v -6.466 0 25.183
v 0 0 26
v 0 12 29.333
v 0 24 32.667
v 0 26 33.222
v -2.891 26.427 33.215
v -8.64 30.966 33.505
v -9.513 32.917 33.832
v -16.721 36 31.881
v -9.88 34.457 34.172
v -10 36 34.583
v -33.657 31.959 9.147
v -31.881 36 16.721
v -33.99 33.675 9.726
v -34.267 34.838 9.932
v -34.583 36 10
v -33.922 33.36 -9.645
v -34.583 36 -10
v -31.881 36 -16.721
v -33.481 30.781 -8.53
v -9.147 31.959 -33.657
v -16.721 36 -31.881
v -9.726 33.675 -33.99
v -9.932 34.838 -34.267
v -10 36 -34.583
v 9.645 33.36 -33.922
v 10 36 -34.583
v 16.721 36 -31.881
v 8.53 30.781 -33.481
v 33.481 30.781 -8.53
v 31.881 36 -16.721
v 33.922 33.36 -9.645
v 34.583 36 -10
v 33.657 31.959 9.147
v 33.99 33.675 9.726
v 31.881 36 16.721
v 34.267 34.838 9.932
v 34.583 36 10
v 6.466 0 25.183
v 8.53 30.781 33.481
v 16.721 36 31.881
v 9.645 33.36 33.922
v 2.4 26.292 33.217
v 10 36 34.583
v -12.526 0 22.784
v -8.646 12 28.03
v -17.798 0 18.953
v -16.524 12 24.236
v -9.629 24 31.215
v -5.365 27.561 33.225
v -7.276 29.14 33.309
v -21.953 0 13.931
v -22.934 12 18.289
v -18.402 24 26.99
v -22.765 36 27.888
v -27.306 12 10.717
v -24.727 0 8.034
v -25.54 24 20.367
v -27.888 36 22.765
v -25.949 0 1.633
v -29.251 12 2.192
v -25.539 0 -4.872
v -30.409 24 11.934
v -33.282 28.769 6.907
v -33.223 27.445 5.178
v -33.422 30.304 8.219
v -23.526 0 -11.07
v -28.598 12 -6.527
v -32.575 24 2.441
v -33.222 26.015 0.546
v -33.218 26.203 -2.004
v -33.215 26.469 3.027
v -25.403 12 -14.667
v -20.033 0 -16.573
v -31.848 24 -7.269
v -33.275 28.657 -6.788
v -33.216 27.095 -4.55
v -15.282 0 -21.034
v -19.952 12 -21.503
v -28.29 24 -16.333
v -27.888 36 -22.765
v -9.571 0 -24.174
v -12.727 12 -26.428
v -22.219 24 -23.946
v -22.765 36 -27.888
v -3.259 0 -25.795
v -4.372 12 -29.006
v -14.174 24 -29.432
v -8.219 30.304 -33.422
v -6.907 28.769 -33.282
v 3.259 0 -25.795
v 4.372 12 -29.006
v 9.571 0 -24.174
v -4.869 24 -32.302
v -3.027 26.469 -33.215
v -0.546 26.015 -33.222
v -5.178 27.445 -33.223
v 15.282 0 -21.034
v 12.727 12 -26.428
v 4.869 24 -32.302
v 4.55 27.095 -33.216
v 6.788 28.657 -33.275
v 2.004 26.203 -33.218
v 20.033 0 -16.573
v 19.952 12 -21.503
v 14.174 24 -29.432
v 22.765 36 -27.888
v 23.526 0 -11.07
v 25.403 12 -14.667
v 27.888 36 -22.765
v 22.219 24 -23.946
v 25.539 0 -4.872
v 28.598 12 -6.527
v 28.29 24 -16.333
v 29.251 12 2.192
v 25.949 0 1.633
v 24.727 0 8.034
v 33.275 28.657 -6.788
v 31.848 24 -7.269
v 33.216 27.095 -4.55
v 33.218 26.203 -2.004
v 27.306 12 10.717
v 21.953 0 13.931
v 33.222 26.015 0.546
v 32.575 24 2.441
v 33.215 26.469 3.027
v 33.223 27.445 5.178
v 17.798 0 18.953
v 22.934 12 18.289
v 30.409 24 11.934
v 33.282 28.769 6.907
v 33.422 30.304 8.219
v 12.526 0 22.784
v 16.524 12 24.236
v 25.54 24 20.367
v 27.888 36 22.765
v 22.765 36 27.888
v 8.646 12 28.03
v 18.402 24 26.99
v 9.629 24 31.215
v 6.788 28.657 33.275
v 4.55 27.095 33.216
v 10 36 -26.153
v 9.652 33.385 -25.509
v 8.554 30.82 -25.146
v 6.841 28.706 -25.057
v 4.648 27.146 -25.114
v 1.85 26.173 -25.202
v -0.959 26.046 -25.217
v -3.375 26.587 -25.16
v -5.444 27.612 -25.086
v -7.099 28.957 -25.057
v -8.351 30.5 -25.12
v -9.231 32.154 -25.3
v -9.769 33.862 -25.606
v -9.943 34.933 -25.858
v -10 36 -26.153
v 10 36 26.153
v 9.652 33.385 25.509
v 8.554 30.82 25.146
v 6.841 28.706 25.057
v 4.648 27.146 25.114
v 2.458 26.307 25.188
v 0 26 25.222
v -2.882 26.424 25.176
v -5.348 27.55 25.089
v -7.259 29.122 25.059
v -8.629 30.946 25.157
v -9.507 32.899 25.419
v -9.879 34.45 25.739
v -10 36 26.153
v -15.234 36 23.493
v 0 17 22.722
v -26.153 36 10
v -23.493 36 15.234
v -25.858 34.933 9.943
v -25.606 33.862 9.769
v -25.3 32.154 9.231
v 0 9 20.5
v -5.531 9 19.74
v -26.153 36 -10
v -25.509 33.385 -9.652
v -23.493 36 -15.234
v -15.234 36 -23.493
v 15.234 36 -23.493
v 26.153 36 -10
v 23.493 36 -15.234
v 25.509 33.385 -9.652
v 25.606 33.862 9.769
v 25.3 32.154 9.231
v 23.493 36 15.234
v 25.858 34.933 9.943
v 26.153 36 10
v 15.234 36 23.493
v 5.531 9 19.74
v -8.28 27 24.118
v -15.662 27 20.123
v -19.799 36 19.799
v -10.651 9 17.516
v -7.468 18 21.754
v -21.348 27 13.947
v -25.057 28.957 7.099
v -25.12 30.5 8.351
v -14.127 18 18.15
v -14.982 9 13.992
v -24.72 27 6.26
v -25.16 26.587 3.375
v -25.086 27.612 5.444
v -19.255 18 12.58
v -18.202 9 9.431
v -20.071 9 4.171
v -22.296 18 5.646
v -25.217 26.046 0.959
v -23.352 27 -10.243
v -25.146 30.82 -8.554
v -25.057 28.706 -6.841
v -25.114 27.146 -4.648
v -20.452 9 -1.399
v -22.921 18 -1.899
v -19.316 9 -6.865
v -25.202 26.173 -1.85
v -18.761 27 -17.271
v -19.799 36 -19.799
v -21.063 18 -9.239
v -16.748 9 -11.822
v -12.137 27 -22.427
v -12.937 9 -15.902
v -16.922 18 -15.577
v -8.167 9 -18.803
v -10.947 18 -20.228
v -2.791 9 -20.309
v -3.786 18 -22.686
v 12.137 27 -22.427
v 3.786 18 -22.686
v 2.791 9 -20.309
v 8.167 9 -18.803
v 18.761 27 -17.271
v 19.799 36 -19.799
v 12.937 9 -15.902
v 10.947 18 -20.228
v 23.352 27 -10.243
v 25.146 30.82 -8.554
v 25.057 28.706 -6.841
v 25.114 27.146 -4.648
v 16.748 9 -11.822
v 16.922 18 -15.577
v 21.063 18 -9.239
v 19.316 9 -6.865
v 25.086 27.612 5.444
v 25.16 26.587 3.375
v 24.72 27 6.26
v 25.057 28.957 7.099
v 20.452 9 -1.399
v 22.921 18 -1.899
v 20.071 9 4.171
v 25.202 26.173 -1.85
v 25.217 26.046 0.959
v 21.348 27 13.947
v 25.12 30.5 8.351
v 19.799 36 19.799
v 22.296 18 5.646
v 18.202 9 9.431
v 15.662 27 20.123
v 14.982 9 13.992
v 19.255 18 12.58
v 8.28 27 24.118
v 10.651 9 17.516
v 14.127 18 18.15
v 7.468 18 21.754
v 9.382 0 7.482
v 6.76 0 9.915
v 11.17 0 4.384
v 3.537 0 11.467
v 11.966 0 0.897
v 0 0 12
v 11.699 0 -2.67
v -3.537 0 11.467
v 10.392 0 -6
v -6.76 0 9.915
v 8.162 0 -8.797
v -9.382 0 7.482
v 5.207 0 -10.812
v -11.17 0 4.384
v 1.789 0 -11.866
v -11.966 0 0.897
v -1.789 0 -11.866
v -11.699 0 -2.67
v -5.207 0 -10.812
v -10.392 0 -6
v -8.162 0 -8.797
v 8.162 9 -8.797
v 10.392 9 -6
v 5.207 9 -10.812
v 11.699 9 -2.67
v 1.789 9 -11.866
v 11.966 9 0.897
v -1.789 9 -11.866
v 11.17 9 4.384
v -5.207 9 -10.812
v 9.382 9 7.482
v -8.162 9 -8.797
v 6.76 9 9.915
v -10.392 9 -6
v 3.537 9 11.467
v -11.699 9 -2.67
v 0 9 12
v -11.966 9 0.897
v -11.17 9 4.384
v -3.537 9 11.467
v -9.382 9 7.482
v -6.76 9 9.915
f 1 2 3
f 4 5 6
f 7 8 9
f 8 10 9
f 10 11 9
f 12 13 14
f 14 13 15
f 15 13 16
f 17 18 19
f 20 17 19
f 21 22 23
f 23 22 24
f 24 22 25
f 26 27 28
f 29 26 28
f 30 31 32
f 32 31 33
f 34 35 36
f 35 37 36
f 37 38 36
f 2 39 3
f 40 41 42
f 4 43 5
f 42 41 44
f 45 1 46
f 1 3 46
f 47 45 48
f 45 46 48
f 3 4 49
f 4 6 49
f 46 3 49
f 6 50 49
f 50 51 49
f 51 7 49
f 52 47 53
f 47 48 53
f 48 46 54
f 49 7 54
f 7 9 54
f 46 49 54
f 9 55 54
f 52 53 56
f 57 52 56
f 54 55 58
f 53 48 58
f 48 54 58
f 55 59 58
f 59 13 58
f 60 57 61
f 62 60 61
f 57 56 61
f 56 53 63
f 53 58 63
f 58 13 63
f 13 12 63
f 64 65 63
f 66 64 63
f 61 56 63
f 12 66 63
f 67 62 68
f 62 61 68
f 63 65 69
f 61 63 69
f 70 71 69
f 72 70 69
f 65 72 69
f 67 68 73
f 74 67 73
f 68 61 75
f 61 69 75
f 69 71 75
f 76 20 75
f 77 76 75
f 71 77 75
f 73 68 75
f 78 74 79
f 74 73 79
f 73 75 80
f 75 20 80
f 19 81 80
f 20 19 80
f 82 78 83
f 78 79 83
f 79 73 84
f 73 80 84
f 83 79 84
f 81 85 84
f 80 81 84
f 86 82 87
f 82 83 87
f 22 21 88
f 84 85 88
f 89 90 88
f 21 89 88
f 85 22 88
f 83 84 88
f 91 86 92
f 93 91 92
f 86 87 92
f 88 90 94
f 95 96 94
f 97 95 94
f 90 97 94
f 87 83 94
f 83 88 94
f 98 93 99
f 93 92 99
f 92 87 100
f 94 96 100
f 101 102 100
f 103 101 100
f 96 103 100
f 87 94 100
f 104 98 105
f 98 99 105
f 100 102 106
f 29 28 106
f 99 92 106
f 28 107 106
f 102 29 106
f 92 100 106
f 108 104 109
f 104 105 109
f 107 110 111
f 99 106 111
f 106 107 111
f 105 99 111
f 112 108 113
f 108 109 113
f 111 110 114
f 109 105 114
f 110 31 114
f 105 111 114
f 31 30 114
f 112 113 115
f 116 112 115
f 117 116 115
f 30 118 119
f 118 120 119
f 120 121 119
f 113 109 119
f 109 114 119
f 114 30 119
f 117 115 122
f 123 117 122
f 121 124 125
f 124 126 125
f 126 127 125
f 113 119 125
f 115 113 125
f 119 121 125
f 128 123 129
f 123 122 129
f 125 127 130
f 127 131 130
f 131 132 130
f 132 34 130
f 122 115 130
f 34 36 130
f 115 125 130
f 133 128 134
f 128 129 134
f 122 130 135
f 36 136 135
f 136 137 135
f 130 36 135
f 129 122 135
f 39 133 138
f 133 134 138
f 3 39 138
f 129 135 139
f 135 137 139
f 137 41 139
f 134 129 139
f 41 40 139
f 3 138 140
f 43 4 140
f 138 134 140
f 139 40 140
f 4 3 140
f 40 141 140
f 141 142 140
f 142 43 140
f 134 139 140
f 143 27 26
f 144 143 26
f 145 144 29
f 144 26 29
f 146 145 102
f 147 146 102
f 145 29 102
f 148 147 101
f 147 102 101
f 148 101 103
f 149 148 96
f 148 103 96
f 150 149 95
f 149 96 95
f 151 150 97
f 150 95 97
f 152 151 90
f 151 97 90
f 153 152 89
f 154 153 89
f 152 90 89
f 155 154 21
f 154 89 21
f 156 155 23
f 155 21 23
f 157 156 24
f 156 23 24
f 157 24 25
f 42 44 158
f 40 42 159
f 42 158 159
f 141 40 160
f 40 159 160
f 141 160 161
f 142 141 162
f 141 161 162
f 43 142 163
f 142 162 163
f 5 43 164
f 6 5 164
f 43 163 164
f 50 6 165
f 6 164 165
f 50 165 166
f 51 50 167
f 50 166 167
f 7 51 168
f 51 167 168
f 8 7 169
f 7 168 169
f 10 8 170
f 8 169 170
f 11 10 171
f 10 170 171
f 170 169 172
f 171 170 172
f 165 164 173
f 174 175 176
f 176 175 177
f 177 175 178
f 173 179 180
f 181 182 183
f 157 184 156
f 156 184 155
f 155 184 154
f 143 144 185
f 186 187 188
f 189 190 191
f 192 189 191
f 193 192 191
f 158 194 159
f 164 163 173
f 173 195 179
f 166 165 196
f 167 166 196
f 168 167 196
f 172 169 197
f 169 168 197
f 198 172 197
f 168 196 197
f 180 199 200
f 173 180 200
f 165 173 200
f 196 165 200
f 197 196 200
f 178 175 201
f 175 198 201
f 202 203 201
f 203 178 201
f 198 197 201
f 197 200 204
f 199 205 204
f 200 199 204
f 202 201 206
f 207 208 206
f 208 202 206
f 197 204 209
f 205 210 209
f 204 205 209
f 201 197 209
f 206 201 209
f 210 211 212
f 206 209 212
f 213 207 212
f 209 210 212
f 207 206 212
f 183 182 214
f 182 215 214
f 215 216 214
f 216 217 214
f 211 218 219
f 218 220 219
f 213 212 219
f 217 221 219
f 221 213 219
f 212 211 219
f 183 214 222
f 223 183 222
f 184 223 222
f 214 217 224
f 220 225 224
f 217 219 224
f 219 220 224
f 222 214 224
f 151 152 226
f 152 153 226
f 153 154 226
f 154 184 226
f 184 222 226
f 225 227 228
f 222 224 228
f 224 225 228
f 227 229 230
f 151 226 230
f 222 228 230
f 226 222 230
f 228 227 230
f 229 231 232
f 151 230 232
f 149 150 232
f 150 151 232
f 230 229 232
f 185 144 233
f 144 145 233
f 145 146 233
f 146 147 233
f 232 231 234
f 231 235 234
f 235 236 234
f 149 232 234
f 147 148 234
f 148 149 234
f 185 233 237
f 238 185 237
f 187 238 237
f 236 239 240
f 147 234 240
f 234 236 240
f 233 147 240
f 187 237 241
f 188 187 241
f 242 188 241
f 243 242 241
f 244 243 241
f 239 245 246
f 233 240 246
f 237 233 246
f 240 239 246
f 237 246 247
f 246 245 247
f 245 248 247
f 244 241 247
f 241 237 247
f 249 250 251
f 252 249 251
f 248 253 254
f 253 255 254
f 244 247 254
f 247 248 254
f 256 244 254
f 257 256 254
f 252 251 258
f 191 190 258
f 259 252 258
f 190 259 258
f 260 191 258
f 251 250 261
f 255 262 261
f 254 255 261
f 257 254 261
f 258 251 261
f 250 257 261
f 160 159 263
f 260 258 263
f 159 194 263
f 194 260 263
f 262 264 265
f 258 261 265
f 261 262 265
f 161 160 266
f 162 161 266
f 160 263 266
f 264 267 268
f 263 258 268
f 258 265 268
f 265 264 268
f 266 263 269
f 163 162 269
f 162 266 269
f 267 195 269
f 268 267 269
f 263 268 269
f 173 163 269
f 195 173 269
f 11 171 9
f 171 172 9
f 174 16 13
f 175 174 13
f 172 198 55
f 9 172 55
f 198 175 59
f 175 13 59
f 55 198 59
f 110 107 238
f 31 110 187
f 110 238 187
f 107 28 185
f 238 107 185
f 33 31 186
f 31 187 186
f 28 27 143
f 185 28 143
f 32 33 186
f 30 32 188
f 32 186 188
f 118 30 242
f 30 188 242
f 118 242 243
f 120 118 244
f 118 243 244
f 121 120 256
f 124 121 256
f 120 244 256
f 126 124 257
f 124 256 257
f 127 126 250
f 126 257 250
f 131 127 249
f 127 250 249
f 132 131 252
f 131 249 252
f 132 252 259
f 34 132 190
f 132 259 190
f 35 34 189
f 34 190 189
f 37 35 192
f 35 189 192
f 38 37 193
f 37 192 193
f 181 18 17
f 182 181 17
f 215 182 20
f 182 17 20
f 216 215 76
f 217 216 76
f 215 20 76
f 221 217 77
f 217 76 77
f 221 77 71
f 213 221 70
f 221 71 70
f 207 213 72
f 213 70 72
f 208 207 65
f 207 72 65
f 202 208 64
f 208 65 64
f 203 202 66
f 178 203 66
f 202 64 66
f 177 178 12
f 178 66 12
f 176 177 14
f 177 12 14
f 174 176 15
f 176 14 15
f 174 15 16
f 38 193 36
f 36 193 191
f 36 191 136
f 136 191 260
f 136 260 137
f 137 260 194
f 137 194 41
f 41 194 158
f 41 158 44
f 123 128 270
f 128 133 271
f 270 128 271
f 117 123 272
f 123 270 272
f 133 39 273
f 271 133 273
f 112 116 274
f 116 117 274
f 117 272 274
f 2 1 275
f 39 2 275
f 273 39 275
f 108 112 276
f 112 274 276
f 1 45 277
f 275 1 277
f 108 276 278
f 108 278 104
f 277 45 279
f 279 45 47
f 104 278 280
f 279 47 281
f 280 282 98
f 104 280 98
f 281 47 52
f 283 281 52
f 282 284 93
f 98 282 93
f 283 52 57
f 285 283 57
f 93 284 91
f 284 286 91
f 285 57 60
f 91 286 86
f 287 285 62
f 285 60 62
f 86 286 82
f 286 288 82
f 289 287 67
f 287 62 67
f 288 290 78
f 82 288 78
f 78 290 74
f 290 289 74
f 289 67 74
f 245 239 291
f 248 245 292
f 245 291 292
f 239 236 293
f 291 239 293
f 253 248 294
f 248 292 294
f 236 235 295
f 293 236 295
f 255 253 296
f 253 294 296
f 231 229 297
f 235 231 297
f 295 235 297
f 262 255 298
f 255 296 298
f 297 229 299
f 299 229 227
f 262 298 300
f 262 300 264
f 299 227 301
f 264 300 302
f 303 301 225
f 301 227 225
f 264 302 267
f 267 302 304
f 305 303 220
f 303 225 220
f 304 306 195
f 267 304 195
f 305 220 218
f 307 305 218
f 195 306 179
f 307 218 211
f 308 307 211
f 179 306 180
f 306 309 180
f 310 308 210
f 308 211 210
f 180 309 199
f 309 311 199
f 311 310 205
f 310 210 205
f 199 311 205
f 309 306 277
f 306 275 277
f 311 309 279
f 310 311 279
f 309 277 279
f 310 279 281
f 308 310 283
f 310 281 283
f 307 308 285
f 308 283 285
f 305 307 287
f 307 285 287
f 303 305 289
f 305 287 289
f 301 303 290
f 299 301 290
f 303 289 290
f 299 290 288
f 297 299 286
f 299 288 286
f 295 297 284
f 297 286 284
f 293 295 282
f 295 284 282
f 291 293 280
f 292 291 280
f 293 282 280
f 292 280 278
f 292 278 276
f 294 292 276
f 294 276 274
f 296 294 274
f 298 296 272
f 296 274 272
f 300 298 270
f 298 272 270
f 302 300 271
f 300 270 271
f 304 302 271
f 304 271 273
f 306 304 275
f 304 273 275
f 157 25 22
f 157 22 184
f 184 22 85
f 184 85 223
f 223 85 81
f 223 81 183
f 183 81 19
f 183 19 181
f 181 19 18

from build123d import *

# Parameters (mm, degrees)
CUT_EXTRUDE1_DEPTH      = 63.353829072
CUT_EXTRUDE1_DEPTH_BACK = 63.353829072
CUT_EXTRUDE2_DEPTH      = 62.546730387
CUT_EXTRUDE2_DEPTH_BACK = 62.546730387


with BuildPart() as part:
    # Sketch1 → Revolve1 (revolve)
    with BuildSketch(Plane.XY, mode=Mode.PRIVATE) as revolve1_sk:
        Polygon((12, 0), (26, 0), (36, 36), (28, 36), (20.5, 9), (12, 9), align=None)
    revolve(revolve1_sk.sketch.rotate(Axis((0, 54.736842105, 0), (0, -1, 0)), 90), axis=Axis((0, 54.736842105, 0), (0, -1, 0)))

    # Sketch2 → Cut-Extrude1 (cut, two sides: drawn at the far end of the back side and taken through both)
    with BuildSketch(Plane(origin=(0, 0, 0), x_dir=(0, 0, -1), z_dir=(1, 0, 0)).offset(-CUT_EXTRUDE1_DEPTH_BACK)):
        with BuildLine():
            Line((-10, 36), (10, 36))
            ThreePointArc((10, 36), (0, 26), (-10, 36))
        make_face()
    extrude(amount=CUT_EXTRUDE1_DEPTH + CUT_EXTRUDE1_DEPTH_BACK, mode=Mode.SUBTRACT)

    # Sketch3 → Cut-Extrude2 (cut, two sides: drawn at the far end of the back side and taken through both)
    with BuildSketch(Plane.XY.offset(-CUT_EXTRUDE2_DEPTH_BACK)):
        with BuildLine():
            Line((-10, 36), (10, 36))
            ThreePointArc((10, 36), (0, 26), (-10, 36))
        make_face()
    extrude(amount=CUT_EXTRUDE2_DEPTH + CUT_EXTRUDE2_DEPTH_BACK, mode=Mode.SUBTRACT)


solid = part.part
